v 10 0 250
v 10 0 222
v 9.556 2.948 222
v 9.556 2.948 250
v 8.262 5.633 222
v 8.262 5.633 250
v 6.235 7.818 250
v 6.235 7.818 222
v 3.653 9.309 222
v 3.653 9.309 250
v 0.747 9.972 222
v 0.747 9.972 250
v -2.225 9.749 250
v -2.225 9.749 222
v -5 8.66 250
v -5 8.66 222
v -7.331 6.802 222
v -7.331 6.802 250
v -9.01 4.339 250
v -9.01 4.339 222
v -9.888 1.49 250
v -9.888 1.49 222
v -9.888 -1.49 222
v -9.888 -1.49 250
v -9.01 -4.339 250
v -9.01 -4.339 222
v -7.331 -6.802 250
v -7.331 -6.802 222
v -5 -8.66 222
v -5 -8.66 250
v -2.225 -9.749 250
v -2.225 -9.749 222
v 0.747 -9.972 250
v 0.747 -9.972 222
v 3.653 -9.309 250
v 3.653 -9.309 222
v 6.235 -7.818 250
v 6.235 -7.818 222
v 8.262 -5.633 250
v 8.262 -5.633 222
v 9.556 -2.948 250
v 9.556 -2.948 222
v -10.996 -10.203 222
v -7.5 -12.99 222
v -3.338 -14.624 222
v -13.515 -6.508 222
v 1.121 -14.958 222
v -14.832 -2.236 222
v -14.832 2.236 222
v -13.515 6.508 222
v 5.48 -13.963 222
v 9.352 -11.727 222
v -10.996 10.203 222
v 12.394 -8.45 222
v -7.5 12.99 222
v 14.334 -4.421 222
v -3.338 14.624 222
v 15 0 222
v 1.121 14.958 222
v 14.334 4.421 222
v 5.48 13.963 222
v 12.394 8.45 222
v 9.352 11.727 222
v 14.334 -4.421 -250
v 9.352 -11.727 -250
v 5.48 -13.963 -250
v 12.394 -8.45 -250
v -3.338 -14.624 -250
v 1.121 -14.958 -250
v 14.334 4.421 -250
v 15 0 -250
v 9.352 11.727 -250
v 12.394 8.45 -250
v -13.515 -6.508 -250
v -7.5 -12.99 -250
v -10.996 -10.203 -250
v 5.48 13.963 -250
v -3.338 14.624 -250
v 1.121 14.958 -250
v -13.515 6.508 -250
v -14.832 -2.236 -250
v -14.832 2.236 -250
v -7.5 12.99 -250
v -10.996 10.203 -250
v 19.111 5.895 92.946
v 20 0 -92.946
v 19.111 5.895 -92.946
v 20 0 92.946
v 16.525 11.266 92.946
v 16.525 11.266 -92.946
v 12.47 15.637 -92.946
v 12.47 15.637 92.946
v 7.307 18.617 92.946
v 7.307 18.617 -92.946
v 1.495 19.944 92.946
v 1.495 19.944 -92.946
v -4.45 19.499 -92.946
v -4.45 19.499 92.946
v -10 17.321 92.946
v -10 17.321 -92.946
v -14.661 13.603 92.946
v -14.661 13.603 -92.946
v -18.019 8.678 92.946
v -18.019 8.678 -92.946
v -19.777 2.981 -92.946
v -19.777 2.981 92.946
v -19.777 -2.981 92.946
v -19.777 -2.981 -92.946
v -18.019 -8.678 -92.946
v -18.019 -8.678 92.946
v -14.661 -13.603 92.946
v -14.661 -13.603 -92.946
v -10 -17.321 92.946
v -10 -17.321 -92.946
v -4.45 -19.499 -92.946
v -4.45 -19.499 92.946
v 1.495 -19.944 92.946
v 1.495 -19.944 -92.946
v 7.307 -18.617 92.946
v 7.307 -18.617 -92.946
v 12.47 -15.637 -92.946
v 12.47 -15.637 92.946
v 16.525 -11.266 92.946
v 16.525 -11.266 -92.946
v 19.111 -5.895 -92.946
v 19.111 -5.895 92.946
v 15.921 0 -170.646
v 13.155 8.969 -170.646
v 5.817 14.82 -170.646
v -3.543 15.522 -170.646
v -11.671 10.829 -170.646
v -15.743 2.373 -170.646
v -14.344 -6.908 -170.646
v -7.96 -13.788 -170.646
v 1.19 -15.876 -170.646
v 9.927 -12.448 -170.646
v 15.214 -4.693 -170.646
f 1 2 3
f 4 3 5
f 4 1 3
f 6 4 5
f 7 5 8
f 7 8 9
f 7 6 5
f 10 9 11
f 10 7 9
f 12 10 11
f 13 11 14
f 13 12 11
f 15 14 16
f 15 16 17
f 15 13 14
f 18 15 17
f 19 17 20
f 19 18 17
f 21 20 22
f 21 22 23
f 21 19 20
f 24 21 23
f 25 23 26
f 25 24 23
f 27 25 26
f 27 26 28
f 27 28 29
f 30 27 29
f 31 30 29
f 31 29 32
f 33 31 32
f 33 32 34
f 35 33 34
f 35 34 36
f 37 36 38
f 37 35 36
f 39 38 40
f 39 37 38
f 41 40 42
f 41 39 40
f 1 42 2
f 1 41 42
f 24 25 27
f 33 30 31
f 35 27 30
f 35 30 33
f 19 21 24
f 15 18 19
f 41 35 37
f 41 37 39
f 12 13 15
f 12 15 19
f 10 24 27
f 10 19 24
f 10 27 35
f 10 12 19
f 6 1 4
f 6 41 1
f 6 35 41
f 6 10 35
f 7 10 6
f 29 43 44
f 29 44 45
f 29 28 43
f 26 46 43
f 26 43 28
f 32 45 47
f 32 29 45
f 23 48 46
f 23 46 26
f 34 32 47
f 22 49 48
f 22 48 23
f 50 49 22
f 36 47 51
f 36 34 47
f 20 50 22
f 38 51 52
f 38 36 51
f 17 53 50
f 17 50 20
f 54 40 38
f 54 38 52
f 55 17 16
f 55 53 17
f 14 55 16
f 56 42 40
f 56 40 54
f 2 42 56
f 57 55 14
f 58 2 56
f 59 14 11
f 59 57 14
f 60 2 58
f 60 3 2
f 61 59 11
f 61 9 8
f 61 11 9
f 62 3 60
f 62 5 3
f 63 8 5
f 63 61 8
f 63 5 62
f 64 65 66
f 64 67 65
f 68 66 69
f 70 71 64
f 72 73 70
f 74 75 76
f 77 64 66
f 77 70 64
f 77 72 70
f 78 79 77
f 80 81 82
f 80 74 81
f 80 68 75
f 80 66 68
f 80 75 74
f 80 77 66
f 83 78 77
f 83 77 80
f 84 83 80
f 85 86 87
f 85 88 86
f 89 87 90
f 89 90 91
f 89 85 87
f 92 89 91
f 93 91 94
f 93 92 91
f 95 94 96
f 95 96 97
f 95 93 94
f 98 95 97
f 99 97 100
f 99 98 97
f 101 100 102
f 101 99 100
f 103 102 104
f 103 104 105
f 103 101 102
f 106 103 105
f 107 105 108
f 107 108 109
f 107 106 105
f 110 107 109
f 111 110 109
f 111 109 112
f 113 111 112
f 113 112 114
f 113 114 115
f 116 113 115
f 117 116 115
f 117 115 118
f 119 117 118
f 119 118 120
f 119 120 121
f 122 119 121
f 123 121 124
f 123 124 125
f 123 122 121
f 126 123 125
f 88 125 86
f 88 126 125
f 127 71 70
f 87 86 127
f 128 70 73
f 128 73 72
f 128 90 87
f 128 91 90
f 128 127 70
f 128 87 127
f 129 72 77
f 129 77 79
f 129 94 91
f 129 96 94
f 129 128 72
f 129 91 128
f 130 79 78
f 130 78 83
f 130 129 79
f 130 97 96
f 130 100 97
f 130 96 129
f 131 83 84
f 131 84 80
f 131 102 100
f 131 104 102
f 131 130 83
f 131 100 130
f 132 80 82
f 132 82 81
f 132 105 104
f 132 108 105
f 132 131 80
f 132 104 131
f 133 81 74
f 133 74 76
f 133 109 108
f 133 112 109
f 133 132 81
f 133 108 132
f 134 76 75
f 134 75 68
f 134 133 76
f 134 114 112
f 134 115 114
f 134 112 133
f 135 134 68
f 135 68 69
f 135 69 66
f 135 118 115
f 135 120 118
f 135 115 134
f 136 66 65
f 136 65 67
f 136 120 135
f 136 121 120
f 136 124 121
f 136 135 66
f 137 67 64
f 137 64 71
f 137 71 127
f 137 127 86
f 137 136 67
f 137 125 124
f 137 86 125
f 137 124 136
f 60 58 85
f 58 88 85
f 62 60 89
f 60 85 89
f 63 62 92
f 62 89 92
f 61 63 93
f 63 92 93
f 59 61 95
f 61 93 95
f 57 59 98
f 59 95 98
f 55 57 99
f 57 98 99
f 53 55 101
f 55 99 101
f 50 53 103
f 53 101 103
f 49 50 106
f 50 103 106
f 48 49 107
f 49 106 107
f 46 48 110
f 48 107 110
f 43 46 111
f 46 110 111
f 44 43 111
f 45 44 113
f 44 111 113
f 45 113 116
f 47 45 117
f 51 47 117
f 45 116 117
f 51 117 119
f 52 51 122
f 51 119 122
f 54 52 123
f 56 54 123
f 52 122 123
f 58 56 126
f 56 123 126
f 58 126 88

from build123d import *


# Not quite as in the source:
# - a feature names something its author has since deleted; it is built from what else it names


with BuildPart() as f1:
    # F0 (on Front) → F1 (revolve)
    with BuildSketch(Plane.XZ):
        with BuildLine():
            Line((0, 250), (0, 0))
            Line((0, 0), (0, -250))
            Line((0, -250), (15, -250))
            add(Edge.make_bspline(
                [(15, -250), (13.4045789018, -193.5875862837), (17.3846632242, -147.1532583237), (20, -92.9462272166)],
                knots=[0, 0, 0, 0, 157.1333432009, 157.1333432009, 157.1333432009, 157.1333432009], degree=3))
            Line((20, -92.9462272166), (20, 0))
            Line((20, 0), (20, 92.9462272166))
            add(Edge.make_bspline(
                [(15, 222), (16.6666666667, 181.3154090722), (18.3333333333, 133.6308181444), (20, 92.9462272166)],
                knots=[0, 0, 0, 0, 129.1505953127, 129.1505953127, 129.1505953127, 129.1505953127], degree=3))
            Line((15, 222), (10, 222))
            Line((10, 222), (10, 250))
            Line((10, 250), (0, 250))
        make_face()
    revolve(axis=Axis((0, 0, 125), (0, 0, 1)))


solid = f1.part
